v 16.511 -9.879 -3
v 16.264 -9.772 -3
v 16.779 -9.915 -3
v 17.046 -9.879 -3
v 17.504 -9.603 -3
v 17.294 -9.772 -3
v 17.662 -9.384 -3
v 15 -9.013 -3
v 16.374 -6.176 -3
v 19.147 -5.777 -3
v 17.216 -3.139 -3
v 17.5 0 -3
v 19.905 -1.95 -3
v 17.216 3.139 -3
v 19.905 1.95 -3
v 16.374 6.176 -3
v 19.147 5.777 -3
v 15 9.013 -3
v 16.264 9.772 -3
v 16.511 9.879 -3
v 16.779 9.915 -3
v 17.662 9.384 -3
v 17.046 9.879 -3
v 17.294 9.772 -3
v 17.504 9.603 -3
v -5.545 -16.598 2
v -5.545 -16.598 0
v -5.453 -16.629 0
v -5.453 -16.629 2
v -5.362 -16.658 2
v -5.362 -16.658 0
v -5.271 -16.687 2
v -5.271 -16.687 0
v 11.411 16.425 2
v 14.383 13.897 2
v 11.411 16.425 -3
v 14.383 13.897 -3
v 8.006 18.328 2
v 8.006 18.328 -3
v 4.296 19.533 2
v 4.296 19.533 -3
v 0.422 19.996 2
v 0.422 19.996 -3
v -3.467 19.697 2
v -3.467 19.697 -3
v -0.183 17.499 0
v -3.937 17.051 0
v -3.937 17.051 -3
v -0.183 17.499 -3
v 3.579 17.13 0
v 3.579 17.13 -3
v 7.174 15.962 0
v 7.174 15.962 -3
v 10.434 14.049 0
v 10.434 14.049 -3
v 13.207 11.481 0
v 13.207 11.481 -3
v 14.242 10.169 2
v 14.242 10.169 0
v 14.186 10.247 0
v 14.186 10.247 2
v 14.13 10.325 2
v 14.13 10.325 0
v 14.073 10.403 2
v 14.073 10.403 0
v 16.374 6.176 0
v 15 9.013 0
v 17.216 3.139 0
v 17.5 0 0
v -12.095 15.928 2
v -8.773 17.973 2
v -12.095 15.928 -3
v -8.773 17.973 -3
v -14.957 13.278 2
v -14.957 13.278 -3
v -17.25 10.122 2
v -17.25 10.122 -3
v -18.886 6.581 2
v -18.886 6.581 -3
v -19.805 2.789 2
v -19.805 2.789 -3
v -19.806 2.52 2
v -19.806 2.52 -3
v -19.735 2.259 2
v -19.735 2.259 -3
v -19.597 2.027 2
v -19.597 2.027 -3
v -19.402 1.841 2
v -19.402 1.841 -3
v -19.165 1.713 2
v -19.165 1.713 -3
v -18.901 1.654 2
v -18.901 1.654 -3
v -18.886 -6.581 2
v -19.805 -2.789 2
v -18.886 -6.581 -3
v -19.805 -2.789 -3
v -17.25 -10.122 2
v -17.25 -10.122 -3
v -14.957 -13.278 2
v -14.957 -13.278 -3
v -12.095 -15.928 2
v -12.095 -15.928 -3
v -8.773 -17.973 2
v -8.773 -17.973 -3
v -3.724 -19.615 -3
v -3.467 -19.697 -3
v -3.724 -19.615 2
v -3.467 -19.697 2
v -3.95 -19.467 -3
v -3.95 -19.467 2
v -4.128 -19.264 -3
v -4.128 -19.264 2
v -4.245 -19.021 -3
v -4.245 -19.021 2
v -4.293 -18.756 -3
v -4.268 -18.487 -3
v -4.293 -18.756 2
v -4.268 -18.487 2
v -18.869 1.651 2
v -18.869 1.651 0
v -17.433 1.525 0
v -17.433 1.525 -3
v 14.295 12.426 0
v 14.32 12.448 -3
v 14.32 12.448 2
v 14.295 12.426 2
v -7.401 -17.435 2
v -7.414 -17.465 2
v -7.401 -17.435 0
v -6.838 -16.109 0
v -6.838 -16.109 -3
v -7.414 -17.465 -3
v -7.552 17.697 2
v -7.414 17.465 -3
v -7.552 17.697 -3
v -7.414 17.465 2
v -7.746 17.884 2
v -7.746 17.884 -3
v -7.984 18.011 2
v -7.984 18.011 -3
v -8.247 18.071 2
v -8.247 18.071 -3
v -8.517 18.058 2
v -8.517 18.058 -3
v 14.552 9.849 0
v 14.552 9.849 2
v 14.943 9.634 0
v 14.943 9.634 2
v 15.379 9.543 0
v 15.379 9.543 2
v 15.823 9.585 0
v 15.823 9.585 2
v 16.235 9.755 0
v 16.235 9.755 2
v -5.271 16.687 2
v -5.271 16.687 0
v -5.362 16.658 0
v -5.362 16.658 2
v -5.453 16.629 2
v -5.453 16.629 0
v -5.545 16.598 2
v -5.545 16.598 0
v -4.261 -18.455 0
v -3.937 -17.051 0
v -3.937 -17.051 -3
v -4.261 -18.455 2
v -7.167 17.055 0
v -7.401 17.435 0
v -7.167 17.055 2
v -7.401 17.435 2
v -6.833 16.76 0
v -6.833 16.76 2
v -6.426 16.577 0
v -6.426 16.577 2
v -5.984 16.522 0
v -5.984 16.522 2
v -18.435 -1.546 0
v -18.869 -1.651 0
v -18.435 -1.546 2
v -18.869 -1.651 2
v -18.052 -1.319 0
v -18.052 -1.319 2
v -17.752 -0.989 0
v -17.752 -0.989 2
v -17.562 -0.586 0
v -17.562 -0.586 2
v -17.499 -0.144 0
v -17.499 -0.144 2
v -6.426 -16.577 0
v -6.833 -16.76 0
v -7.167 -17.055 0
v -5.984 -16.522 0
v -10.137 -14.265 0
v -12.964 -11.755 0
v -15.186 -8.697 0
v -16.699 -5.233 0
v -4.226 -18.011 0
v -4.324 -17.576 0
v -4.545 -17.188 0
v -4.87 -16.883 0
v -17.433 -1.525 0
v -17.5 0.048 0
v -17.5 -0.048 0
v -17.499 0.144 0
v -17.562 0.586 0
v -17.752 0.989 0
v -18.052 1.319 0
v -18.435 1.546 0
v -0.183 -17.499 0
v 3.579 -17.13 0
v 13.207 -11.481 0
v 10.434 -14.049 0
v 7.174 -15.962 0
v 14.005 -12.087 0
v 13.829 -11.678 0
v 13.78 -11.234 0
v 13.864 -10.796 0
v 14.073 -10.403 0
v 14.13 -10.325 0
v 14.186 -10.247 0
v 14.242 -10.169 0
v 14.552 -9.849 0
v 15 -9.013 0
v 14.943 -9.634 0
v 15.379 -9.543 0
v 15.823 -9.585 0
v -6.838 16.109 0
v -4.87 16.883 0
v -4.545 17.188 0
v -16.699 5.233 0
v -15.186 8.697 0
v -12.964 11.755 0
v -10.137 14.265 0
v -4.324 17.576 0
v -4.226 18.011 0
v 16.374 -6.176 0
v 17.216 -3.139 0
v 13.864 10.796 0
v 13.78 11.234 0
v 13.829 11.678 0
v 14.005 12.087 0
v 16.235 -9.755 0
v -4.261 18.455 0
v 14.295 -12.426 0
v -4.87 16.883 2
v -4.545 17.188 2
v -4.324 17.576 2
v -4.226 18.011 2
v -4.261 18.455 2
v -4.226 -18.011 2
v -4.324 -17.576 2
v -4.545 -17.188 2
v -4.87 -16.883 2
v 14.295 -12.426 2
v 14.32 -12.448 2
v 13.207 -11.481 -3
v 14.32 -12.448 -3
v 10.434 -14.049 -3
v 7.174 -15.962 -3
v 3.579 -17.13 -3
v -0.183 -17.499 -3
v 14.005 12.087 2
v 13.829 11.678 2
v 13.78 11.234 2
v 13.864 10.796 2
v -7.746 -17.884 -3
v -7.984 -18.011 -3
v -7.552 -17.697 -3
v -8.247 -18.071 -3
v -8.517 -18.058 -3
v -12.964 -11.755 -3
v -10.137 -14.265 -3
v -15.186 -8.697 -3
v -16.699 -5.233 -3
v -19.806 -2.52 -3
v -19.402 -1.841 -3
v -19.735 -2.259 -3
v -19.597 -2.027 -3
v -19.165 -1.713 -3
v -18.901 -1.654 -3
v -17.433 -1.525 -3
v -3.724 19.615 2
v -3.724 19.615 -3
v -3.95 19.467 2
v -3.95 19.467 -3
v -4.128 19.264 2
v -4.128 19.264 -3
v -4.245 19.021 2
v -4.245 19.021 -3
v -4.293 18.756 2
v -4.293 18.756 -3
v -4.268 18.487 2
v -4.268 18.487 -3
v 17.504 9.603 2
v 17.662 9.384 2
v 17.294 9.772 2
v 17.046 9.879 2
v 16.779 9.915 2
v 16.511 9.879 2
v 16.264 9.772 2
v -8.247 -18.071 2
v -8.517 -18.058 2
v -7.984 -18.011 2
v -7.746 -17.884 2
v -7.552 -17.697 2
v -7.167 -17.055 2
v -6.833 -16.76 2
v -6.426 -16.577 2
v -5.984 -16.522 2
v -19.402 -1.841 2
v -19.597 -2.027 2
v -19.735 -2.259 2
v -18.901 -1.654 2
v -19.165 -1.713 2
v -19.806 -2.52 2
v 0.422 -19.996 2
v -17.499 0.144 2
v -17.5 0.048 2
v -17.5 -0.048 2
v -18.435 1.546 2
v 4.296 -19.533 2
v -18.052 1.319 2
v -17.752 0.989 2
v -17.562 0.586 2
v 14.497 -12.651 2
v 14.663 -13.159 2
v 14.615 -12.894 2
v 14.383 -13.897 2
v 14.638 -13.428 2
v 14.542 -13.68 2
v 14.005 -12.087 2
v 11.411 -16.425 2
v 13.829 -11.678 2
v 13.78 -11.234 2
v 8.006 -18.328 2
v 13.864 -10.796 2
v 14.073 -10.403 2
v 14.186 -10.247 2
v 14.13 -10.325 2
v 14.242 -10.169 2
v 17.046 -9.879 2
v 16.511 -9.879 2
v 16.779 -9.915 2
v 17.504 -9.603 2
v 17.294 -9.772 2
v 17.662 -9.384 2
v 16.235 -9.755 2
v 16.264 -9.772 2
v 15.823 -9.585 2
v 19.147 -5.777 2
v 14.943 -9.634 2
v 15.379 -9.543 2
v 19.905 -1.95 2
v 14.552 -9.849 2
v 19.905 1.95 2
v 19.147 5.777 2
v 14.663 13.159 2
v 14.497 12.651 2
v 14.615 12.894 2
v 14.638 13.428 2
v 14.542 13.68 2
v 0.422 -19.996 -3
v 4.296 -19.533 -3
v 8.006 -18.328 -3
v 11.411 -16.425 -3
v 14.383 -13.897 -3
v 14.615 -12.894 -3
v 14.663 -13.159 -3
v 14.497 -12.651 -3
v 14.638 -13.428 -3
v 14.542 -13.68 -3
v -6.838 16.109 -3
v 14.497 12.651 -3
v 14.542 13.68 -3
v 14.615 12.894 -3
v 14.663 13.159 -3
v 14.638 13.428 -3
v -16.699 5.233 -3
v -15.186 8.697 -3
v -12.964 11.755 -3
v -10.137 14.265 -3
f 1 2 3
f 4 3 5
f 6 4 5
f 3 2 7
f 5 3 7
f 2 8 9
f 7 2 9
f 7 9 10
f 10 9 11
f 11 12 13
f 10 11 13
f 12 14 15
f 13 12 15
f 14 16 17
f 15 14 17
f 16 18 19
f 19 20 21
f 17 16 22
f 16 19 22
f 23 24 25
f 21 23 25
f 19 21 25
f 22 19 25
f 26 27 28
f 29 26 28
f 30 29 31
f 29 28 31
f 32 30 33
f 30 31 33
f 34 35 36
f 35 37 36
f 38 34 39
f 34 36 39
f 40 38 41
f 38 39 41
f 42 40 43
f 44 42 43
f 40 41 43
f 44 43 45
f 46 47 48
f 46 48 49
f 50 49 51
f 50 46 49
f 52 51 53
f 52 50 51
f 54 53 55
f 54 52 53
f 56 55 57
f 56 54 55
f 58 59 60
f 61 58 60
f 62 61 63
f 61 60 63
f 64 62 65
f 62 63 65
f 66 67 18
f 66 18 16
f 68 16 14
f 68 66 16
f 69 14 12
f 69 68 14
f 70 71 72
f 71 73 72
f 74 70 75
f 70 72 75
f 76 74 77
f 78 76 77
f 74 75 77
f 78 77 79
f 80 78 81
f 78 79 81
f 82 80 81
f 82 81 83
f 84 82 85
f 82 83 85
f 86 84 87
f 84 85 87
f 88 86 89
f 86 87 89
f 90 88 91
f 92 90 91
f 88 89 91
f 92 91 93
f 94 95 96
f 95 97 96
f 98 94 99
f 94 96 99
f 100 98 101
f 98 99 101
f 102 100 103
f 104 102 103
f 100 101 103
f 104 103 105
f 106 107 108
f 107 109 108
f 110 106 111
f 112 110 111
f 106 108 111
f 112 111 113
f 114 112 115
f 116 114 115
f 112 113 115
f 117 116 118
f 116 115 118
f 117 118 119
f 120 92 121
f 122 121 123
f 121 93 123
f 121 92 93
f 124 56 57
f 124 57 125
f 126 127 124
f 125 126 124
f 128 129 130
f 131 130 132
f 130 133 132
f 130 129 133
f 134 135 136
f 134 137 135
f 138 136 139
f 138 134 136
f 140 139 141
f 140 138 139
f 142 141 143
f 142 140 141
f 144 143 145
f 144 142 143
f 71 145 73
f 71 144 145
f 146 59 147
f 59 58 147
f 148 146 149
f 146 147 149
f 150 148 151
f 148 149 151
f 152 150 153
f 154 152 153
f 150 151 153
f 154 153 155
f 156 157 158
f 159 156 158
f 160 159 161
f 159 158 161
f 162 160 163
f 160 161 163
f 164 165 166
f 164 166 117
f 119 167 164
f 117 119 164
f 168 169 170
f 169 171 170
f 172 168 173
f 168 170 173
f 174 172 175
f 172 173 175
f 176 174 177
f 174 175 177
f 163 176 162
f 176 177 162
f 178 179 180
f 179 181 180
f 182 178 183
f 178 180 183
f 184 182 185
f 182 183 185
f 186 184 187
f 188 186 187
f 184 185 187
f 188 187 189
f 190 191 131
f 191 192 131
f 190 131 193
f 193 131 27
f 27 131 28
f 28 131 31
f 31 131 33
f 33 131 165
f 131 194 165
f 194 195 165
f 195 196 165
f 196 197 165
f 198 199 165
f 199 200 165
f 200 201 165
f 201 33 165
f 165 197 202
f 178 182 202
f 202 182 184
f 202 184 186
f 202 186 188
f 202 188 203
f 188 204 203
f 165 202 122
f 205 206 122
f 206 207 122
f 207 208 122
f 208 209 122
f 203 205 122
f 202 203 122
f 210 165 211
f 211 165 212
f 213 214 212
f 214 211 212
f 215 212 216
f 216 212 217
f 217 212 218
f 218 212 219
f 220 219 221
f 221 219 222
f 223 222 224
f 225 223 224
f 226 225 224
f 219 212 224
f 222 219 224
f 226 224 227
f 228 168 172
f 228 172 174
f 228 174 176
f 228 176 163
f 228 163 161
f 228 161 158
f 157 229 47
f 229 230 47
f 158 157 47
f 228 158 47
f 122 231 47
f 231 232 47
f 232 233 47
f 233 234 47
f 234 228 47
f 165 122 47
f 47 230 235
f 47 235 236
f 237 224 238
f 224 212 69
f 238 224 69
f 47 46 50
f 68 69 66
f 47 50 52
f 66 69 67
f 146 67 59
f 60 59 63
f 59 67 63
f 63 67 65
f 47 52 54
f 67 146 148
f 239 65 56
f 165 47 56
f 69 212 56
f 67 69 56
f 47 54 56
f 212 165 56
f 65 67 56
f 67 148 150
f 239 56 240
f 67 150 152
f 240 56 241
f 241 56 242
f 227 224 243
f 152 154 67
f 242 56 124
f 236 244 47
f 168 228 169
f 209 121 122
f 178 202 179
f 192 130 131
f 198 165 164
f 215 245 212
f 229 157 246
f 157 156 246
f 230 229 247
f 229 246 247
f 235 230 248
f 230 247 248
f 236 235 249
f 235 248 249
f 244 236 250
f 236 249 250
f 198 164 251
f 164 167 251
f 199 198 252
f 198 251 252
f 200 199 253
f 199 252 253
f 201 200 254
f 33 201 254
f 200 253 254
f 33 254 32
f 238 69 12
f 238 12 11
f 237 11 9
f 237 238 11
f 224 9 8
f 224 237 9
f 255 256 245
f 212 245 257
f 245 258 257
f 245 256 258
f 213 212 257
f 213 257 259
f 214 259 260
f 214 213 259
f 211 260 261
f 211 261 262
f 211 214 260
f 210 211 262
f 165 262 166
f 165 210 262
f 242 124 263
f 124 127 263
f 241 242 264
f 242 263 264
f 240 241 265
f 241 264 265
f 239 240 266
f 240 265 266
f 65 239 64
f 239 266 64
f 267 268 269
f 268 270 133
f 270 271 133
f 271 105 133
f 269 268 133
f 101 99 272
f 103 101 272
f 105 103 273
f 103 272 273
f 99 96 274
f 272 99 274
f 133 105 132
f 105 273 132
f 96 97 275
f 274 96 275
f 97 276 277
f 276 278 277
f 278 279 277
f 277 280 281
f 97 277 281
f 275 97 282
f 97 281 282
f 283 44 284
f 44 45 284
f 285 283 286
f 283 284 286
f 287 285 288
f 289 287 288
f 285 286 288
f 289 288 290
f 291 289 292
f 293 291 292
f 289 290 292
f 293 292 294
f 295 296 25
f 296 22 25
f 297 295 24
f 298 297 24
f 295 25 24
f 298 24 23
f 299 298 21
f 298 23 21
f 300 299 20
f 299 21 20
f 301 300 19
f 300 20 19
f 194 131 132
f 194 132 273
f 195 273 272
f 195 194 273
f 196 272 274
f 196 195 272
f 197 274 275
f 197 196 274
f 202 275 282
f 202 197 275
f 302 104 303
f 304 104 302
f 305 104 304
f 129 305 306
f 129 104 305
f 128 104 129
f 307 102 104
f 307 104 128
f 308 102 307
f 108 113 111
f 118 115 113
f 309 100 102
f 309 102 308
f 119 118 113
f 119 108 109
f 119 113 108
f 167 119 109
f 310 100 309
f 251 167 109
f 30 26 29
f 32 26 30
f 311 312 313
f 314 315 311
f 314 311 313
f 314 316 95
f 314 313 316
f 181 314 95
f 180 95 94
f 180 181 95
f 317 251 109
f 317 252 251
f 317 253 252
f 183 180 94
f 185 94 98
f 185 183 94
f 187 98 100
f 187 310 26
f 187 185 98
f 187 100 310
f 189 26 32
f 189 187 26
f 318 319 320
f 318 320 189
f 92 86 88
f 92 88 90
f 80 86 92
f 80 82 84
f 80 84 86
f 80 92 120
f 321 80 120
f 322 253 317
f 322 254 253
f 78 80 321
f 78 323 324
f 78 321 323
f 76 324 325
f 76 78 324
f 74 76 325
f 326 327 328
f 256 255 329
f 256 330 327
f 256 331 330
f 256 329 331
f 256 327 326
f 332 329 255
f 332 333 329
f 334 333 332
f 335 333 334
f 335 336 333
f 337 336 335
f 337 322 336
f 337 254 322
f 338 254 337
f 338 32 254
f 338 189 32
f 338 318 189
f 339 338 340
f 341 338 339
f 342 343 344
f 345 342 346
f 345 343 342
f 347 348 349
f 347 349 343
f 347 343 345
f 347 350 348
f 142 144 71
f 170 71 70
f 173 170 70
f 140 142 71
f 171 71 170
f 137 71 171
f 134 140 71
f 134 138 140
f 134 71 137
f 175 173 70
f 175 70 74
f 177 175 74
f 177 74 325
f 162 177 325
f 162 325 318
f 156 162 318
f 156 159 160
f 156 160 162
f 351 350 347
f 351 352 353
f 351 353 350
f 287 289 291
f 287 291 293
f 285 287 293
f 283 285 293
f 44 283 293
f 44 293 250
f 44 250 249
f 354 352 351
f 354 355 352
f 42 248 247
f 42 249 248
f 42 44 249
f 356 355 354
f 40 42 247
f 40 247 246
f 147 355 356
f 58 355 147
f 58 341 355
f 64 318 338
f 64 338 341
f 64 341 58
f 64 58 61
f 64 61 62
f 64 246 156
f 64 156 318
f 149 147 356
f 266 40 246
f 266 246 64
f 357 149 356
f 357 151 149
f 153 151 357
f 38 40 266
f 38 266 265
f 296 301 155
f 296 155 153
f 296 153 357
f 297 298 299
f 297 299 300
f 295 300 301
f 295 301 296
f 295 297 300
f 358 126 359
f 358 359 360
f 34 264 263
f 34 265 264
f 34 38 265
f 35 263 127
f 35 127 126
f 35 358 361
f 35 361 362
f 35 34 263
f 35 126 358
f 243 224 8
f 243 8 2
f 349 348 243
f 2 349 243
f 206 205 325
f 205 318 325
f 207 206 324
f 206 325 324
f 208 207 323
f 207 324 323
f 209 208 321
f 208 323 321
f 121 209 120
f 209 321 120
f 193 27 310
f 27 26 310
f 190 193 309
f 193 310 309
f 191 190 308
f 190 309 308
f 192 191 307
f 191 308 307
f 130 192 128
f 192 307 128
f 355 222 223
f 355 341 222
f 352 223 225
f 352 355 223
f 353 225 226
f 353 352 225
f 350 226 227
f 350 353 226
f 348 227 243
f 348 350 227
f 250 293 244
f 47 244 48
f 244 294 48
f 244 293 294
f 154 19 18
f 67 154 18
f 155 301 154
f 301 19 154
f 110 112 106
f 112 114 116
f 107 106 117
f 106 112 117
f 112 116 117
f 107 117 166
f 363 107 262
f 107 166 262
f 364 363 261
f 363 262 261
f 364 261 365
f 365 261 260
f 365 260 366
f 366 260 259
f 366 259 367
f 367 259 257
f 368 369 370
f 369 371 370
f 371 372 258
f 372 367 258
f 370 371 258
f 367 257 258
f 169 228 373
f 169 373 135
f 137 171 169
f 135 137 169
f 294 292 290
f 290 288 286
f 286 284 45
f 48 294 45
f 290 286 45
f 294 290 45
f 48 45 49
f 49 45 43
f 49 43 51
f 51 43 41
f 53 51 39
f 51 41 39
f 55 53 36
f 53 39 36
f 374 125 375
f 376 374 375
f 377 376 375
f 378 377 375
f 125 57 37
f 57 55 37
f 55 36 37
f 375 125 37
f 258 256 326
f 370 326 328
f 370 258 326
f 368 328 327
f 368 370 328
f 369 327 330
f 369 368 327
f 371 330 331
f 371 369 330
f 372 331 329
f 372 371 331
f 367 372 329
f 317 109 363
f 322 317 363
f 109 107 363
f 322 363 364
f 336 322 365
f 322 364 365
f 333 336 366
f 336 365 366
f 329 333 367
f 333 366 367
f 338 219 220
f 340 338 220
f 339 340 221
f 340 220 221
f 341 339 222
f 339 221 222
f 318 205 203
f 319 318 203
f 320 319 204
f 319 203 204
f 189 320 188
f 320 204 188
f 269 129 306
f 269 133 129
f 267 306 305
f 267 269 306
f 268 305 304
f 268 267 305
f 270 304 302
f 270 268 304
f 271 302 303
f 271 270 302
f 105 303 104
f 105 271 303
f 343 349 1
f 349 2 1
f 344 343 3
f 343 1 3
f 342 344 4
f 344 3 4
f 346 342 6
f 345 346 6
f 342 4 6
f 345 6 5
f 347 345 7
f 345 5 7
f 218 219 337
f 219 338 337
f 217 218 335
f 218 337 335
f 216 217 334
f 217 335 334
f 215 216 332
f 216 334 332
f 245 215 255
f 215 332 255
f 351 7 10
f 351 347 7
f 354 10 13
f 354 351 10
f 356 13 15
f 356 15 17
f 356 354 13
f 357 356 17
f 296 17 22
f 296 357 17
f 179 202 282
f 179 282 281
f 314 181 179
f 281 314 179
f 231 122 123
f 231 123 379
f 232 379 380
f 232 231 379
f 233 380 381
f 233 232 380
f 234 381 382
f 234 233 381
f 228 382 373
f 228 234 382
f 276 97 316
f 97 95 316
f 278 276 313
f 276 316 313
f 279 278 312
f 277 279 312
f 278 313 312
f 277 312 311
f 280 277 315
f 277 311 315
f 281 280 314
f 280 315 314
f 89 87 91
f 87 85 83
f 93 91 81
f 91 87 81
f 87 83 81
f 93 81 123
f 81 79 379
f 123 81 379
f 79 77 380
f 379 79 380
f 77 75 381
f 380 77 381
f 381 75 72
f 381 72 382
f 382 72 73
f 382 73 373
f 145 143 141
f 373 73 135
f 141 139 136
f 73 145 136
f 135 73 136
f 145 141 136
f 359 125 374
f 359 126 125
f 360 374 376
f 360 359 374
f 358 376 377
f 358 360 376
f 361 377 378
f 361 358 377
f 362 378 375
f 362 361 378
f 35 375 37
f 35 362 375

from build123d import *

# Parameters (mm, degrees)
F1_DEPTH      = 2
F2_DEPTH      = 2
F2_DEPTH_BACK = 3
F3_R          = 1.5
F4_R          = 1


with BuildPart() as f1:
    # F0 (on Top) → F1 (new body)
    with BuildSketch(Plane.XY):
        with BuildLine():
            ThreePointArc((15.0004277623, -9.0131663109), (16.8635329312, -4.6766715814), (17.5, 0))
            ThreePointArc((17.5, 0), (16.8635329312, 4.6766715814), (15.0004277623, 9.0131663109))
            ThreePointArc((15.0004277623, 9.0131663109), (14.1577974016, 10.2862419151), (13.2074176539, 11.4810330073))
            ThreePointArc((13.2074176539, 11.4810330073), (5.4077974016, 16.6434890352), (-3.936643451, 17.0514761337))
            ThreePointArc((-3.936643451, 17.0514761337), (-5.4077974016, 16.6434890352), (-6.8377947486, 16.1088349354))
            ThreePointArc((-6.8377947486, 16.1088349354), (-14.1577974016, 10.2862419151), (-17.4334072166, 1.5252254981))
            ThreePointArc((-17.4334072166, 1.5252254981), (-17.5, 0), (-17.4334072166, -1.5252254981))
            ThreePointArc((-17.4334072166, -1.5252254981), (-14.1577974016, -10.2862419151), (-6.8377947486, -16.1088349354))
            ThreePointArc((-6.8377947486, -16.1088349354), (-5.4077974016, -16.6434890352), (-3.936643451, -17.0514761337))
            ThreePointArc((-3.936643451, -17.0514761337), (5.4077974016, -16.6434890352), (13.2074176539, -11.4810330073))
            ThreePointArc((13.2074176539, -11.4810330073), (14.1577974016, -10.2862419151), (15.0004277623, -9.0131663109))
        make_face()
    extrude(amount=F1_DEPTH)

    # F0 (on Top) → F2 (join, two sides)
    with BuildSketch(Plane.XY) as f2_sk:
        with BuildLine():
            ThreePointArc((15.0004277623, 9.0131663109), (16.8635329312, 4.6766715814), (17.5, 0))
            ThreePointArc((17.5, 0), (16.8635329312, -4.6766715814), (15.0004277623, -9.0131663109))
            Line((15.0004277623, -9.0131663109), (17.143346014, -10.3007614982))
            ThreePointArc((17.143346014, -10.3007614982), (20, 0), (17.143346014, 10.3007614982))
            Line((17.143346014, 10.3007614982), (15.0004277623, 9.0131663109))
        make_face()
        with BuildLine():
            ThreePointArc((-3.936643451, 17.0514761337), (5.4077974016, 16.6434890352), (13.2074176539, 11.4810330073))
            Line((13.2074176539, 11.4810330073), (15.0941916045, 13.1211805798))
            ThreePointArc((15.0941916045, 13.1211805798), (6.1803398875, 19.0211303259), (-4.4990210869, 19.4874012957))
            Line((-4.4990210869, 19.4874012957), (-3.936643451, 17.0514761337))
        make_face()
        with BuildLine():
            ThreePointArc((-17.4334072166, 1.5252254981), (-14.1577974016, 10.2862419151), (-6.8377947486, 16.1088349354))
            Line((-6.8377947486, 16.1088349354), (-7.8146225698, 18.410097069))
            ThreePointArc((-7.8146225698, 18.410097069), (-16.1803398875, 11.7557050458), (-19.9238939618, 1.743114855))
            Line((-19.9238939618, 1.743114855), (-17.4334072166, 1.5252254981))
        make_face()
        with BuildLine():
            Line((-7.8146225698, -18.410097069), (-6.8377947486, -16.1088349354))
            ThreePointArc((-6.8377947486, -16.1088349354), (-14.1577974016, -10.2862419151), (-17.4334072166, -1.5252254981))
            Line((-17.4334072166, -1.5252254981), (-19.9238939618, -1.743114855))
            ThreePointArc((-19.9238939618, -1.743114855), (-16.1803398875, -11.7557050458), (-7.8146225698, -18.410097069))
        make_face()
        with BuildLine():
            Line((15.0941916045, -13.1211805798), (13.2074176539, -11.4810330073))
            ThreePointArc((13.2074176539, -11.4810330073), (5.4077974016, -16.6434890352), (-3.936643451, -17.0514761337))
            Line((-3.936643451, -17.0514761337), (-4.4990210869, -19.4874012957))
            ThreePointArc((-4.4990210869, -19.4874012957), (6.1803398875, -19.0211303259), (15.0941916045, -13.1211805798))
        make_face()
    extrude(amount=F2_DEPTH)
    extrude(f2_sk.sketch, amount=-F2_DEPTH_BACK)

    # F3
    f3_edges = [f1.edges().sort_by_distance(p)[0] for p in [
        (-17.433407, 1.525225, 1),
        (-17.433407, -1.525225, 1),
        (-3.936643, -17.051476, 1),
        (-6.837795, -16.108835, 1),
        (15.000428, -9.013166, 1),
        (13.207418, -11.481033, 1),
        (13.207418, 11.481033, 1),
        (15.000428, 9.013166, 1),
        (-6.837795, 16.108835, 1),
        (-3.936643, 17.051476, 1),
    ]]
    fillet(f3_edges, radius=F3_R)

    # F4
    f4_edges = [f1.edges().sort_by_distance(p)[0] for p in [
        (15.094192, -13.121181, -0.5),
        (17.143346, -10.300761, -0.5),
        (17.143346, 10.300761, -0.5),
        (15.094192, 13.121181, -0.5),
        (-4.499021, 19.487401, -0.5),
        (-7.814623, 18.410097, -0.5),
        (-19.923894, 1.743115, -0.5),
        (-19.923894, -1.743115, -0.5),
        (-4.499021, -19.487401, -0.5),
        (-7.814623, -18.410097, -0.5),
    ]]
    fillet(f4_edges, radius=F4_R)


solid = f1.part
